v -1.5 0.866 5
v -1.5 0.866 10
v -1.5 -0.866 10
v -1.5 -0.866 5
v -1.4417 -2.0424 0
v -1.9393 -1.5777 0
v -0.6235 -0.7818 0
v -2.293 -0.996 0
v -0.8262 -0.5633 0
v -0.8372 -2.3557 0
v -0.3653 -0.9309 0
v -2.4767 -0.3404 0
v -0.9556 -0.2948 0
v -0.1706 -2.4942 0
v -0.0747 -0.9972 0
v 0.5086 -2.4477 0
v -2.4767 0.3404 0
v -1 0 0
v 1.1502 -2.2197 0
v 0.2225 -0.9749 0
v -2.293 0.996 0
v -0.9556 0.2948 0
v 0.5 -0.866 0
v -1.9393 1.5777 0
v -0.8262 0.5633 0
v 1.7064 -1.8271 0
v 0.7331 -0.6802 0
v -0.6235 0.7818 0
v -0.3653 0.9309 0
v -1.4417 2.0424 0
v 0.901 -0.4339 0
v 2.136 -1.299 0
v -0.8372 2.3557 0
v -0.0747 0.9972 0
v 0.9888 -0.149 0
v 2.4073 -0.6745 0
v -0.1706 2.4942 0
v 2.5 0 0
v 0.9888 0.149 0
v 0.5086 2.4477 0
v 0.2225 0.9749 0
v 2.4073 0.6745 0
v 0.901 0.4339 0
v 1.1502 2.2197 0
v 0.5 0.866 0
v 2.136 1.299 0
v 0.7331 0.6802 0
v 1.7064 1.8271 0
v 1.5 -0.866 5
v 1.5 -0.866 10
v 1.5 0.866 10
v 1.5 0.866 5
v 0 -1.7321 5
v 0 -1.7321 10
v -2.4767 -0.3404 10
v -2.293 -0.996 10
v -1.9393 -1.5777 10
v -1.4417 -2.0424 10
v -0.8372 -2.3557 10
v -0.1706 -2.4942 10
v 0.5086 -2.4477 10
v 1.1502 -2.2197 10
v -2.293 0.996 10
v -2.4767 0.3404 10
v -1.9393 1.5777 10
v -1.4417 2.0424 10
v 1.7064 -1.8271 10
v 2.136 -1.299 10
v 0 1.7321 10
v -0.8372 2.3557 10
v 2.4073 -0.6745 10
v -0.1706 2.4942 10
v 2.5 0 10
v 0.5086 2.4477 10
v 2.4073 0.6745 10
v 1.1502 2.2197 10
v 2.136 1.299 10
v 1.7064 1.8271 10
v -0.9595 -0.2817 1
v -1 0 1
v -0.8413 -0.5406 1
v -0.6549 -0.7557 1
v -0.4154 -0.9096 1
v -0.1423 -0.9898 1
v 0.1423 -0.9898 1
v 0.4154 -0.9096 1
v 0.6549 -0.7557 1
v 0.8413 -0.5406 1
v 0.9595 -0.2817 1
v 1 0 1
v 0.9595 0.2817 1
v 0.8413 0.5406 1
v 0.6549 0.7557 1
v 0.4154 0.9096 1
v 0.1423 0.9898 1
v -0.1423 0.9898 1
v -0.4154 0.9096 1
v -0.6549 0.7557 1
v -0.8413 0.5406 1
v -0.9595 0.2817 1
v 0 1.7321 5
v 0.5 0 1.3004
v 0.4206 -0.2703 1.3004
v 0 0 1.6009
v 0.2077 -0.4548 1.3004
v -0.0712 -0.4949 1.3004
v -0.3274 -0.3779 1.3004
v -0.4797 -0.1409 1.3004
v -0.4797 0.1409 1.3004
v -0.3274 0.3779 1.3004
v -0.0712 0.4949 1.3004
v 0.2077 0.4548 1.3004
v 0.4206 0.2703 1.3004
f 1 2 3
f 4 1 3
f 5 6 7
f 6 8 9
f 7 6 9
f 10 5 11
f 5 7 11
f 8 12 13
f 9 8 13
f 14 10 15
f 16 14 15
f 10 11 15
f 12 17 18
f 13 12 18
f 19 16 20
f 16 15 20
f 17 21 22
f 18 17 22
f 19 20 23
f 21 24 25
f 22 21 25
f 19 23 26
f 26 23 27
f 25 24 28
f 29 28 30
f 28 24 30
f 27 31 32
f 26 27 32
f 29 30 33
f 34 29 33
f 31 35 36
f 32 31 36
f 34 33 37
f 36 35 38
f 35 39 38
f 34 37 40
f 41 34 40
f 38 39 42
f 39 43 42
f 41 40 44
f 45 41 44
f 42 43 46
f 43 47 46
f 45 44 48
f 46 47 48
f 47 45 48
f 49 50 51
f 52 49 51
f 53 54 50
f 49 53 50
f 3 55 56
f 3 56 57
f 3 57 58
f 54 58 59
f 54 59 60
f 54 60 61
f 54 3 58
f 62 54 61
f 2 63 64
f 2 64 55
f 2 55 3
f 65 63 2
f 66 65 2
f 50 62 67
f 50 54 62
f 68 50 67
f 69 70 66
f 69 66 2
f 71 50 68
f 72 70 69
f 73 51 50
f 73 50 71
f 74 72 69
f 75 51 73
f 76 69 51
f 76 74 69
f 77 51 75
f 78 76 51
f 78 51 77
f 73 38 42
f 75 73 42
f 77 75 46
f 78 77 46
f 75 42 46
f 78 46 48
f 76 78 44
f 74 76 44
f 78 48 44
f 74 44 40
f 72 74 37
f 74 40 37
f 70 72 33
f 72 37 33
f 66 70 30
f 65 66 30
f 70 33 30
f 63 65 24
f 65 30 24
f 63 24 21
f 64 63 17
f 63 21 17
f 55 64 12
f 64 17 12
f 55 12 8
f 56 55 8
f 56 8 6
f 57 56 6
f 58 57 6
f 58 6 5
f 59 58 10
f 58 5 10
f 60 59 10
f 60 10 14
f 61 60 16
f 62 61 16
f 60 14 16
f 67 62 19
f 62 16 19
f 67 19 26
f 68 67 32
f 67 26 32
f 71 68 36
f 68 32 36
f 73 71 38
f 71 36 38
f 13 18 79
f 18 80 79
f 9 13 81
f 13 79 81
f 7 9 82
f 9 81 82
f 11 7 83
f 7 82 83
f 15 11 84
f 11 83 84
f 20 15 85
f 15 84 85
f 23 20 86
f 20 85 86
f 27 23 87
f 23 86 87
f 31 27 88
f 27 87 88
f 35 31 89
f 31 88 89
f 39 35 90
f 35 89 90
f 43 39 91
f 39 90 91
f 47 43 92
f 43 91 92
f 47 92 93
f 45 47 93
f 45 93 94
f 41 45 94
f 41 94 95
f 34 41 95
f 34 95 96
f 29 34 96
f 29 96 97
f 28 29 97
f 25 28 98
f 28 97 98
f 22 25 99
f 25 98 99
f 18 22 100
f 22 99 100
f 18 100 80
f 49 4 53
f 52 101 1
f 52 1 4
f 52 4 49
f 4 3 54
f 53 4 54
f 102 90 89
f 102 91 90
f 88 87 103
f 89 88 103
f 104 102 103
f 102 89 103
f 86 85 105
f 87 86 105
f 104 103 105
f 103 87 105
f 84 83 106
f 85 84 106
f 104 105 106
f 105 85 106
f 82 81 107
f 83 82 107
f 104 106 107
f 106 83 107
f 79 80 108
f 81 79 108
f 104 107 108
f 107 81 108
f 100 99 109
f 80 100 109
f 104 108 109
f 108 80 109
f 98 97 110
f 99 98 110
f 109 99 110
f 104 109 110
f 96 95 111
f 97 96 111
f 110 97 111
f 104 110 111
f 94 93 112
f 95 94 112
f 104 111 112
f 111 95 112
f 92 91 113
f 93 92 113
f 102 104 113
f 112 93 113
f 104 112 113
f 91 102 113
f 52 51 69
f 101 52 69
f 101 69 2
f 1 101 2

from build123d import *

# Parameters (mm, degrees)
F0_R     = 2.5
F1_DEPTH = 10
F3_DEPTH = 5
F5_D     = 2
F5_DEPTH = 1
F5_TIP   = 0.600860619


with BuildPart() as f1:
    # F0 (on Top) → F1 (new body)
    with BuildSketch(Plane.XY):
        Circle(F0_R)
    extrude(amount=F1_DEPTH)

    # F2 (on face) → F3 (cut)
    with BuildSketch(Plane.XY.offset(10)):
        Polygon((1.5, -0.8660254038), (1.5, 0.8660254038), (0, 1.7320508076), (-1.5, 0.8660254038), (-1.5, -0.8660254038), (0, -1.7320508076), align=None)
    extrude(amount=-F3_DEPTH, mode=Mode.SUBTRACT)

    # F5
    with Locations(Plane(origin=(0, 0, 0), x_dir=(1, 0, 0), z_dir=(0, 0, -1))):
        with Locations((0, 0)):
            Hole(F5_D / 2, depth=F5_DEPTH)
            with Locations((0, 0, -(F5_DEPTH + F5_TIP / 2))):  # 118° drill point
                Cone(0, F5_D / 2, F5_TIP, mode=Mode.SUBTRACT)


solid = f1.part
